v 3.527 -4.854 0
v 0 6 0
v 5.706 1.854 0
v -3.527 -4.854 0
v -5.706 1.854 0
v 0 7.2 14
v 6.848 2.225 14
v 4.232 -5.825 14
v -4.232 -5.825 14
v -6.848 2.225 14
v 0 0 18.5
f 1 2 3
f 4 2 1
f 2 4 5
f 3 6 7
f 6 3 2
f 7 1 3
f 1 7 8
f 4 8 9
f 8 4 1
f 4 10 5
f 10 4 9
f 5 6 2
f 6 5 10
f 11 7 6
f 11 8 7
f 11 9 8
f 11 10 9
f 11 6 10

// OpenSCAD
/* [Global] */

// Base Polygon Scale
PolyScale = 1; // [1:30]

// Midpoint Polygon Scale
PolyScale2 = 1; // [1:30]

// Total Height
Height = 1; // [1:30]

// Midpoints' Height  
Height2 = 1; // [1:30]

/* [Hidden] */

s 	= PolyScale;
h 	= Height;
s2 = PolyScale2;
h2 = Height2;

polyhedron
    (points = [[0, 0, 18.5*h], [0, 6*s, 0], [5.7063*s, 1.8541*s, 0], [3.5267*s, -4.8541*s, 0], [-3.5267*s, -4.8541*s, 0], [-5.7063*s, 1.8541*s, 0], [0, 7.2*s2, 14*h2], [6.8476*s2, 2.2249*s2, 14*h2], [4.2320*s2, -5.8249*s2, 14*h2], [-4.2320*s2, -5.8249*s2, 14*h2], [-6.8476*s2, 2.2249*s2, 14*h2]],faces = [[5,4,3,2,1], [1,2,7,6], [2,3,8,7], [3,4,9,8], [4,5,10,9], [5,1,6,10], [6,7,0], [7,8,0], [8,9,0], [9,10,0], [10,6,0]]);
